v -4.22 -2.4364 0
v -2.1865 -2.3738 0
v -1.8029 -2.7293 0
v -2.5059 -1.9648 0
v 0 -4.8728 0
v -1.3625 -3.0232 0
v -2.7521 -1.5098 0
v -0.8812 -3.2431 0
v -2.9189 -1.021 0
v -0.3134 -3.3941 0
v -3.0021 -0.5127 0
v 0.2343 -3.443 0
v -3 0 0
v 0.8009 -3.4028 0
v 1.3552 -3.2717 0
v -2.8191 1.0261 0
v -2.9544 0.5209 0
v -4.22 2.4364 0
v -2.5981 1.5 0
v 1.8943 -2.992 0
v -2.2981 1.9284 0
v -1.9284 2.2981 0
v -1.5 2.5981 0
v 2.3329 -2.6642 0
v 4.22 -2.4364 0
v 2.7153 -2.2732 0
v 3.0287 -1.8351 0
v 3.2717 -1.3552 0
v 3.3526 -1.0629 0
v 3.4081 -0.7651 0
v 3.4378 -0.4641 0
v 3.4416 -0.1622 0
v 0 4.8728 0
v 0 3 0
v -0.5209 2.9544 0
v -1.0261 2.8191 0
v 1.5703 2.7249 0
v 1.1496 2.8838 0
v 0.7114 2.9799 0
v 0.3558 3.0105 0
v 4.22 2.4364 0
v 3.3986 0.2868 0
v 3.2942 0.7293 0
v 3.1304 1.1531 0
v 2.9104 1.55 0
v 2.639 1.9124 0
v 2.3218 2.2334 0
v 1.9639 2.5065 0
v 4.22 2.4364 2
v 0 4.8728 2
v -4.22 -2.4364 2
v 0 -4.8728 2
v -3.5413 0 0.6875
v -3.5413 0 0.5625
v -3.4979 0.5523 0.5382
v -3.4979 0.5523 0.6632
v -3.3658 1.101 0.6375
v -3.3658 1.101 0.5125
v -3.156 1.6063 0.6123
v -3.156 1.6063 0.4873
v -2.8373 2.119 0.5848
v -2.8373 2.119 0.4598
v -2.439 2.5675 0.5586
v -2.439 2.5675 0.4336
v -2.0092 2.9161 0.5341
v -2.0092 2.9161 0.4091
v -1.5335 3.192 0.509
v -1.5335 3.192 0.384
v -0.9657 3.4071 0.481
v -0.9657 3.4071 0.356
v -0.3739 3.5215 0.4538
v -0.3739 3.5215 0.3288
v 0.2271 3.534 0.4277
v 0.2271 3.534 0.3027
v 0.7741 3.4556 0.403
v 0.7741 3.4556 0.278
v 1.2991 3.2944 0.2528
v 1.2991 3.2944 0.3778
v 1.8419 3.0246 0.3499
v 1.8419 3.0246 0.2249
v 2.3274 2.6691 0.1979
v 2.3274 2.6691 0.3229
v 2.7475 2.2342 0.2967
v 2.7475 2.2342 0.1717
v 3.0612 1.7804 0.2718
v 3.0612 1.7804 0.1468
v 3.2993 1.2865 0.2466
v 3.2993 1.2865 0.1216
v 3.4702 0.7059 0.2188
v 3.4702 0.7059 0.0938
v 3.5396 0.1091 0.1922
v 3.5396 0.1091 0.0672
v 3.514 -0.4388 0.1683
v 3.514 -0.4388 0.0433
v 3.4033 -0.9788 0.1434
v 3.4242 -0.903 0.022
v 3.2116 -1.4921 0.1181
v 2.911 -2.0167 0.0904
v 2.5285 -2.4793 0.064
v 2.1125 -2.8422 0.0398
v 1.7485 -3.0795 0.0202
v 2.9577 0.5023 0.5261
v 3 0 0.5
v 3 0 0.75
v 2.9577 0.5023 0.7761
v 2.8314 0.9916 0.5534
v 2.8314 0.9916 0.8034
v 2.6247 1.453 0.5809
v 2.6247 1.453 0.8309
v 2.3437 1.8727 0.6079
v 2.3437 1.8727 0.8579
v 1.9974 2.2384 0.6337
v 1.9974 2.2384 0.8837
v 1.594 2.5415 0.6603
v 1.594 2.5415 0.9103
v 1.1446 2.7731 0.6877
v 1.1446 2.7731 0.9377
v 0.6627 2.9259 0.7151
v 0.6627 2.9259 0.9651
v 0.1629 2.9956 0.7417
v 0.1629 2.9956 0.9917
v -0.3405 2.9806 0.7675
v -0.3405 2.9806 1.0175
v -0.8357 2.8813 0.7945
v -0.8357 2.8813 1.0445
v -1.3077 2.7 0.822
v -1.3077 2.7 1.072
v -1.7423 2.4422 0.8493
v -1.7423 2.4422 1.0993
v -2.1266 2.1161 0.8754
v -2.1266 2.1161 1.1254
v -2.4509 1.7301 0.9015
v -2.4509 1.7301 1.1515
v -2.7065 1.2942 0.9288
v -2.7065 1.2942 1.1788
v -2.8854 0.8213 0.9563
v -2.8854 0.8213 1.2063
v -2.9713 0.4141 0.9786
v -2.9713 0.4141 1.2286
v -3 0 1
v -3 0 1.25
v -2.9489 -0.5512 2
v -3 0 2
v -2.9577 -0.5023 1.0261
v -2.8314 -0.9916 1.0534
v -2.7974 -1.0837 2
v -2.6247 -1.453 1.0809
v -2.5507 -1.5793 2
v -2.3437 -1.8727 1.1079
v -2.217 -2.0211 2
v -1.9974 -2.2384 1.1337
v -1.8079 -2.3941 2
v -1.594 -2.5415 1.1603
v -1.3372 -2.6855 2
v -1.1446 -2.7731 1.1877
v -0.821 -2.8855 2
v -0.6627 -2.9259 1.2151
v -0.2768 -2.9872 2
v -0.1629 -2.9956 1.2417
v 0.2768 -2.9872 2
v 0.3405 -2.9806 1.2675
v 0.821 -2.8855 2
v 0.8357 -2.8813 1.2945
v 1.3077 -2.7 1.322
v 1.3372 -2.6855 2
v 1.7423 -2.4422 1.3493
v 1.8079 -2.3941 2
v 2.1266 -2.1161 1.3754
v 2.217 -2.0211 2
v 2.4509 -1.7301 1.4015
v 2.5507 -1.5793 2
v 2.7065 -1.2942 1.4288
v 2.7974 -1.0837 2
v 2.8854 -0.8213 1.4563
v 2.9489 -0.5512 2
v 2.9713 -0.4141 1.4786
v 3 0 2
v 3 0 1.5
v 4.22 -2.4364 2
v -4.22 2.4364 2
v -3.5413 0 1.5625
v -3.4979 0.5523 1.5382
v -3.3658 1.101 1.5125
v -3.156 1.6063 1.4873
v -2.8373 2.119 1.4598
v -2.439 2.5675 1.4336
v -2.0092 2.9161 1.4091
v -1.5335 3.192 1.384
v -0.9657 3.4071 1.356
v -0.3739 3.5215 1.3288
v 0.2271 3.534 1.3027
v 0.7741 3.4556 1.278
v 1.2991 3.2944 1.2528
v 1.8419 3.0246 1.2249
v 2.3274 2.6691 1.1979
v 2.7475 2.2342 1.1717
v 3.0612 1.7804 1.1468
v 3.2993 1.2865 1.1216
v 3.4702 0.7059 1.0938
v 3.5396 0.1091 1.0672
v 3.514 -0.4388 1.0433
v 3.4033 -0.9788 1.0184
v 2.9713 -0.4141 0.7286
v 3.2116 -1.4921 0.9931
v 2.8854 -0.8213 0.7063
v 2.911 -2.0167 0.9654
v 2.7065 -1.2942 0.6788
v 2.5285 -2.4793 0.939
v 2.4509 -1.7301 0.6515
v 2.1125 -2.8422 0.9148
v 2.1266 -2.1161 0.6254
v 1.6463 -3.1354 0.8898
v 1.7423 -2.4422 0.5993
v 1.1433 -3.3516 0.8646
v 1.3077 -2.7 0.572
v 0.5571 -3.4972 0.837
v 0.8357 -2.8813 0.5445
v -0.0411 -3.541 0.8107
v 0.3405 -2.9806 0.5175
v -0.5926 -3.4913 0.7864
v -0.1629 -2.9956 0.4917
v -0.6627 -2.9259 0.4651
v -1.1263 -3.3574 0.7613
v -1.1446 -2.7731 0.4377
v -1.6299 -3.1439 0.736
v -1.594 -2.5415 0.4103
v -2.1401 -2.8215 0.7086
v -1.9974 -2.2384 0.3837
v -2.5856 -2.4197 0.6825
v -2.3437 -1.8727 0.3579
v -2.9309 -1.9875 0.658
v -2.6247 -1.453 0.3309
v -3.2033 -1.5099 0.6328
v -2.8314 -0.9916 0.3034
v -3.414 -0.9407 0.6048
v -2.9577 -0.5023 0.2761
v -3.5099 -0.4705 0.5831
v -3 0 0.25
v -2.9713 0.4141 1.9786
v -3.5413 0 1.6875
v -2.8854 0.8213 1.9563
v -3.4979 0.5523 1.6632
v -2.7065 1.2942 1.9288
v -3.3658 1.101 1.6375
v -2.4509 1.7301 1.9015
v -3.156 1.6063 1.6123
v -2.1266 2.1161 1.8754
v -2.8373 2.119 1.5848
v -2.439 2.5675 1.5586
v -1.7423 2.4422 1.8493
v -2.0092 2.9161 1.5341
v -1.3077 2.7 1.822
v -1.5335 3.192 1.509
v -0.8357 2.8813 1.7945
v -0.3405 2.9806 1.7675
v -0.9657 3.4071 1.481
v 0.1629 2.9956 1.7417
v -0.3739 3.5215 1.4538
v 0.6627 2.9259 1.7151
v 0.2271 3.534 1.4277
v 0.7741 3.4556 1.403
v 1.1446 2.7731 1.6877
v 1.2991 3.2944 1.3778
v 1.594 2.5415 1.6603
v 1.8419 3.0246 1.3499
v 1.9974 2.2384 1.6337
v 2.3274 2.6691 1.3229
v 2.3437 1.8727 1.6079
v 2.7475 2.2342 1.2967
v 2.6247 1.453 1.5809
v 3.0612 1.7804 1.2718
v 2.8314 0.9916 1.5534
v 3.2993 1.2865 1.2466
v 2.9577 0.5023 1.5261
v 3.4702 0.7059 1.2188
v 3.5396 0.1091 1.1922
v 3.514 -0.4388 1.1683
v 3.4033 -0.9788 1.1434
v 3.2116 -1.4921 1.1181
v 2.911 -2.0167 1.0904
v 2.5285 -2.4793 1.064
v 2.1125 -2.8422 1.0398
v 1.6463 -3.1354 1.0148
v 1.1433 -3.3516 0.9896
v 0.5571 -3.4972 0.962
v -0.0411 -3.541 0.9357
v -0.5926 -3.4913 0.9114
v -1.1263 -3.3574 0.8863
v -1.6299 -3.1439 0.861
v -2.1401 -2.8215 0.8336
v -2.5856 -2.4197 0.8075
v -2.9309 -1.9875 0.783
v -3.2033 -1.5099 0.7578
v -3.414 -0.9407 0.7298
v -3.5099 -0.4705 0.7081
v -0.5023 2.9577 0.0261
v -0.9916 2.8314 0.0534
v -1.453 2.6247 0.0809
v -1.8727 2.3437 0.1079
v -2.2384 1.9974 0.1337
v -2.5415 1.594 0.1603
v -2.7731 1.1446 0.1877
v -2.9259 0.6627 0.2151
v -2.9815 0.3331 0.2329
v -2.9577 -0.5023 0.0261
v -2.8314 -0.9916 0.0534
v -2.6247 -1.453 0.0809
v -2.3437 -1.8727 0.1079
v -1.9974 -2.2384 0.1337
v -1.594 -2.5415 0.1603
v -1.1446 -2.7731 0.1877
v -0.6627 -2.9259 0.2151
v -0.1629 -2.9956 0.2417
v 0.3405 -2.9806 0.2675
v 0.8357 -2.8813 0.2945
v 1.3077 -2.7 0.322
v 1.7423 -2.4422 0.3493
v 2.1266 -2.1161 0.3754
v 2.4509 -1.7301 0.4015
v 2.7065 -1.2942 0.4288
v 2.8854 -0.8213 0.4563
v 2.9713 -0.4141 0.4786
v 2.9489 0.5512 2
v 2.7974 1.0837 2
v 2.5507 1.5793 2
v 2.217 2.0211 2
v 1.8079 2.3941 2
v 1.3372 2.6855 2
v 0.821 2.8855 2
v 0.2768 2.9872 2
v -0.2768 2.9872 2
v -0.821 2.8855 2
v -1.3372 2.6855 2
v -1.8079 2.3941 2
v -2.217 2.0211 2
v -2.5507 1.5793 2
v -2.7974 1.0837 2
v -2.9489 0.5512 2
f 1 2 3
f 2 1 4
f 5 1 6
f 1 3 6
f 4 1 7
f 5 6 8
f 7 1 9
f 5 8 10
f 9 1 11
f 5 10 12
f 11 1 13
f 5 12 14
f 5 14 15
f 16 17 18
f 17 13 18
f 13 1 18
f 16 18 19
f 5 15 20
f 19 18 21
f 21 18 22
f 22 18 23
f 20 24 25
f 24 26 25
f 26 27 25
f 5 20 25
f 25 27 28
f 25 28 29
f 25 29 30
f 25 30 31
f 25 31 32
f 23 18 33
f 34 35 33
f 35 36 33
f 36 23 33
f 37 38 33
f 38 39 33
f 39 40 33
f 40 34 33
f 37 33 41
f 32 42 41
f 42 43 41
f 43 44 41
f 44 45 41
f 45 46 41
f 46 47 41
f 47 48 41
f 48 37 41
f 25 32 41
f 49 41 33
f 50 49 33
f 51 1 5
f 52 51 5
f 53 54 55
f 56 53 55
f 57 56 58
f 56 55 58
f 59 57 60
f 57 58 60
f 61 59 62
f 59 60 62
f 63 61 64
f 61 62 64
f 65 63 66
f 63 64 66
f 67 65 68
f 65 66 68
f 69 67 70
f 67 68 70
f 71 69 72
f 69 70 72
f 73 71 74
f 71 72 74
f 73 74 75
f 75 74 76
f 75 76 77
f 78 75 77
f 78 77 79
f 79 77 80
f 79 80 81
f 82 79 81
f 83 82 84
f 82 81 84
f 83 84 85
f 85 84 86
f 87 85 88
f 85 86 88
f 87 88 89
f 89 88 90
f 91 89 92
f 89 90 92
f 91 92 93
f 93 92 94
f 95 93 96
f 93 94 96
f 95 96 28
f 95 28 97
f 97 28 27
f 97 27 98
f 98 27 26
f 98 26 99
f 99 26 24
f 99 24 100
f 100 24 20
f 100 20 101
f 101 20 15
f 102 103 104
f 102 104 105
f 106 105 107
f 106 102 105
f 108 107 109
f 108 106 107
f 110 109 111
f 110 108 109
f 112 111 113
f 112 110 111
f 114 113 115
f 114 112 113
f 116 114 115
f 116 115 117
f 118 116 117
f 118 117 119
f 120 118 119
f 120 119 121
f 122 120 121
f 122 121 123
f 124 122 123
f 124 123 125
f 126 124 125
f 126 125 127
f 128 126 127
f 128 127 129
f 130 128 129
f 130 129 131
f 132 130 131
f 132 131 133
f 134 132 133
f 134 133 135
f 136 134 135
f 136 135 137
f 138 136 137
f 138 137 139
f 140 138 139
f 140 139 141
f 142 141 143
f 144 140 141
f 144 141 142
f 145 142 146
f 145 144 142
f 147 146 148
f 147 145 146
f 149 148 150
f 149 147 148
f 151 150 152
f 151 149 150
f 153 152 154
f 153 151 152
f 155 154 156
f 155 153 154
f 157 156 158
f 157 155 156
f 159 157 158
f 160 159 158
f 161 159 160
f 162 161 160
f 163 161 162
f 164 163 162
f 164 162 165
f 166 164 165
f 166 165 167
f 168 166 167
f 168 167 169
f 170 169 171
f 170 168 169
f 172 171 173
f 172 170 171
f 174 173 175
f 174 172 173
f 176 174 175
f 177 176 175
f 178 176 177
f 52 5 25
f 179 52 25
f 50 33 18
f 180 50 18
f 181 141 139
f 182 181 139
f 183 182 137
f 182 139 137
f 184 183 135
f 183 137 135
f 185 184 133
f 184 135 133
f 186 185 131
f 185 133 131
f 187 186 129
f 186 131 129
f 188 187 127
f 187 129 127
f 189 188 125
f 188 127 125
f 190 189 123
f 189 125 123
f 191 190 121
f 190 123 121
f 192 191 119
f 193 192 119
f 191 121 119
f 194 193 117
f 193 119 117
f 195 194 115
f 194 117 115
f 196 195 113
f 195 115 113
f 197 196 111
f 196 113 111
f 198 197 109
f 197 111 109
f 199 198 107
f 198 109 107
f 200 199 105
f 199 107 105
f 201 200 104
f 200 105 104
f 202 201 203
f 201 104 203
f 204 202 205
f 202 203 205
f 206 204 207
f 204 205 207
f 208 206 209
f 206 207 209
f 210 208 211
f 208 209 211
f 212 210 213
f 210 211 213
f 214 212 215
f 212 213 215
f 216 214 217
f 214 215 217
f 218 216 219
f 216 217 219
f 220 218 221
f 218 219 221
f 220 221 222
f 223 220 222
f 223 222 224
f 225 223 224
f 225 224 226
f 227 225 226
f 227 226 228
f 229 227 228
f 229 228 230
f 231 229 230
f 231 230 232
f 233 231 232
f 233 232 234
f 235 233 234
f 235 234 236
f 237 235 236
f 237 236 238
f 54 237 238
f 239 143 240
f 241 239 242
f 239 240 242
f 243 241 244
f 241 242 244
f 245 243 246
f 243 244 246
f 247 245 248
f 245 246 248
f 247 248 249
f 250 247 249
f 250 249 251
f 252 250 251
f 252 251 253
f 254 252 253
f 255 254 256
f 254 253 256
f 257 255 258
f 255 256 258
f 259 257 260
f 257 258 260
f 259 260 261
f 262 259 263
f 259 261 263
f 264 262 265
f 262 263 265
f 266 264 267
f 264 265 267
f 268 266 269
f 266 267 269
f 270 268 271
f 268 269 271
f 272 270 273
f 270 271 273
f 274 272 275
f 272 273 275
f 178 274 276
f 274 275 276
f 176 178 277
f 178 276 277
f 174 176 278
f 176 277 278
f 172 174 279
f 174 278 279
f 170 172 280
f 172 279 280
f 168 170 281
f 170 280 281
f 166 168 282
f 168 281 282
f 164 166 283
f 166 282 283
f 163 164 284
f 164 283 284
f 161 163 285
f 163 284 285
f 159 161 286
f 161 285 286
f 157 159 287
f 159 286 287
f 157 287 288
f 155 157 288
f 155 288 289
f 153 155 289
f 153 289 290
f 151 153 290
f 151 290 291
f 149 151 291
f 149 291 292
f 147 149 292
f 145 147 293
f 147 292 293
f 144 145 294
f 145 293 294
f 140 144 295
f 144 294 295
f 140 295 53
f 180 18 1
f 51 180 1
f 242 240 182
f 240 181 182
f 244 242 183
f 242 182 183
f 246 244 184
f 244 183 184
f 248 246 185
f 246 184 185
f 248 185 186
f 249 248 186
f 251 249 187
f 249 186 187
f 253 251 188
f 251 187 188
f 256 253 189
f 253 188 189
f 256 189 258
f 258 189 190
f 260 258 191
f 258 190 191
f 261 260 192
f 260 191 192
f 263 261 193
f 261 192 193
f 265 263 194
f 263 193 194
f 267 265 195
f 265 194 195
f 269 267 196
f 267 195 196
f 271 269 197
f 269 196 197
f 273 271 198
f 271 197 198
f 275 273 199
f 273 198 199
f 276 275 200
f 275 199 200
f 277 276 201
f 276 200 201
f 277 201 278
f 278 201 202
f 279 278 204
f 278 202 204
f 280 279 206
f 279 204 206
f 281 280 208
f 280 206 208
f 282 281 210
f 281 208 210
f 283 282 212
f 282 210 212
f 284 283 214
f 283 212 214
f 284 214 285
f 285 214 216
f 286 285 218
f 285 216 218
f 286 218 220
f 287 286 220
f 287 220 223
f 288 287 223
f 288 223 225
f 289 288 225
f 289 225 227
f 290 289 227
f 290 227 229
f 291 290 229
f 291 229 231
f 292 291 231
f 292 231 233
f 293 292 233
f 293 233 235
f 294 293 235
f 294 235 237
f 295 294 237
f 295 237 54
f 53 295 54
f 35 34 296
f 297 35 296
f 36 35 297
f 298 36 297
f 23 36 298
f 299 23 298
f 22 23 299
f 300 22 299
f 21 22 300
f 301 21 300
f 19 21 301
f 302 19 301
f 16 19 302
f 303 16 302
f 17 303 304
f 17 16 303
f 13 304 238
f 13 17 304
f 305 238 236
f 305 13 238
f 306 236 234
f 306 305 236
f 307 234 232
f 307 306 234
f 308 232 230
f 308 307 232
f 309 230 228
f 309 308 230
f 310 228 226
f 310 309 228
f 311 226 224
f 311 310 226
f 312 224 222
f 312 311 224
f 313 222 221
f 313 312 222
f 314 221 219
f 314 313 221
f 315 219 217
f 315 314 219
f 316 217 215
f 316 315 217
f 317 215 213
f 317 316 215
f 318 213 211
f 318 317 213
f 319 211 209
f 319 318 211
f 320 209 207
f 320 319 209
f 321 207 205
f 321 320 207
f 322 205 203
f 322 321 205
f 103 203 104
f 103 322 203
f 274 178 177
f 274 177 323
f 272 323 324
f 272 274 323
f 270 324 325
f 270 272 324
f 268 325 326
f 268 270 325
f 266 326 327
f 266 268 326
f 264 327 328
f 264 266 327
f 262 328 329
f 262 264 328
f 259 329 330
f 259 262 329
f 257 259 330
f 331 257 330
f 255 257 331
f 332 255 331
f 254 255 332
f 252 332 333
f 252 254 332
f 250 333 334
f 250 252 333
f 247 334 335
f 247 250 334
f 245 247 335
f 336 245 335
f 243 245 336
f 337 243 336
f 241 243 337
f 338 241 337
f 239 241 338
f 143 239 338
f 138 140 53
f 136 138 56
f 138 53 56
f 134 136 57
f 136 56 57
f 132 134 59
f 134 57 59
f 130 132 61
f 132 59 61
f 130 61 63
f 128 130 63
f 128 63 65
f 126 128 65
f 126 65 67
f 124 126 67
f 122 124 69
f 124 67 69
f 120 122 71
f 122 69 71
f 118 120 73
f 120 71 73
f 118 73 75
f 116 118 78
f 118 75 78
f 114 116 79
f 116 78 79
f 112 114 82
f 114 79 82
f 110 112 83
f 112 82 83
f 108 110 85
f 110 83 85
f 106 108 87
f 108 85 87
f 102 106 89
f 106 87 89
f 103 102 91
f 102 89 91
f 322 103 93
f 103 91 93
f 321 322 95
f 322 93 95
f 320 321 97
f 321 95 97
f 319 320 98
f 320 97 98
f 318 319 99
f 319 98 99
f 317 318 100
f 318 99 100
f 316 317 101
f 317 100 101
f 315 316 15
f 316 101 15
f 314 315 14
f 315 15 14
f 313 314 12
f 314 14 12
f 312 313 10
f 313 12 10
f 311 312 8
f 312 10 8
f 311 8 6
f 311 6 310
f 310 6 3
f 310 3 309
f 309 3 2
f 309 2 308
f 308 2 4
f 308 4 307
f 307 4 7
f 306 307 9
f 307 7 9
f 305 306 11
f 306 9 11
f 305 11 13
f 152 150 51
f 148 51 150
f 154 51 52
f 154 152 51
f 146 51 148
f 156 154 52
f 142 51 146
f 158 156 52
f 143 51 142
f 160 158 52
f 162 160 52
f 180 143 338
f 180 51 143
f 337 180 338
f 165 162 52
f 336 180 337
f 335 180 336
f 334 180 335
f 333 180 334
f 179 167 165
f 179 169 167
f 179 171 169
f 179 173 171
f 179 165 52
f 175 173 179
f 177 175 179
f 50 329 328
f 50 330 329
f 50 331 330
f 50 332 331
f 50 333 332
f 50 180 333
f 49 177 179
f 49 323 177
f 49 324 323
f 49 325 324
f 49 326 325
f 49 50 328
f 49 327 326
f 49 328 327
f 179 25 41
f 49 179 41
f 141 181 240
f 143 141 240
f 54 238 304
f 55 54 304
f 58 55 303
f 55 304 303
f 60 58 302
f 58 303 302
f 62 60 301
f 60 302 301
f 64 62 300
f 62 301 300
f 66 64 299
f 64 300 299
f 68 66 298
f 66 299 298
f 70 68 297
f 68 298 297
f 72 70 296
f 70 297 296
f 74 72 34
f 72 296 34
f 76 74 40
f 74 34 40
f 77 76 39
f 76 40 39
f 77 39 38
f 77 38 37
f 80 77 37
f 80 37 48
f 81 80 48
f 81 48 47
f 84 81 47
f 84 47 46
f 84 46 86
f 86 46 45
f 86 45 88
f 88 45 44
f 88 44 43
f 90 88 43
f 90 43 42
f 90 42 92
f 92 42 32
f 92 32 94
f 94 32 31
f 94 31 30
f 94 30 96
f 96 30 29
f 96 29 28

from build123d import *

# Parameters (mm, degrees)
SKETCH1_R           = 3
BOSS_EXTRUDE1_DEPTH = 2
THREAD1_PITCH       = 1


with BuildPart() as part:
    # Sketch1 → Boss-Extrude1 (new body)
    with BuildSketch(Plane.XY):
        Polygon((-4.22, -2.436418136), (0, -4.872836272), (4.22, -2.436418136), (4.22, 2.436418136), (0, 4.872836272), (-4.22, 2.436418136), align=None)
        Circle(SKETCH1_R, mode=Mode.SUBTRACT)
    extrude(amount=BOSS_EXTRUDE1_DEPTH)

    # Thread1: the profile of Thread Profile1 profile screwed along a right-hand helix of 2 turns, 8 arcs to a turn; built about Z, then put on its axis
    thread1_z = Axis((0, 0, 0), (0, 0, 1))
    thread1_corners = [(2.9997, 0, -0.000173205), (3.541265875, 0, 0.312499999), (3.541265875, 0, 0.437499999), (2.9997, 0, 0.750173202)]
    with BuildLine(mode=Mode.PRIVATE) as thread1_profile:
        Line(thread1_corners[0], thread1_corners[1])
        Line(thread1_corners[1], thread1_corners[2])
        Line(thread1_corners[2], thread1_corners[3])
        Line(thread1_corners[3], thread1_corners[0])
    thread1_cap = Face(thread1_profile.wire())
    thread1_turn_angles = [0, 22.5, 45, 67.5, 90, 112.5, 135, 157.5, 180, 202.5, 225, 247.5, 270, 292.5, 315, 337.5, 360]
    thread1_turn_weights = [1, 0.9238795325112867, 1, 0.9238795325112867, 1, 0.9238795325112867, 1, 0.9238795325112867, 1, 0.9238795325112867, 1, 0.9238795325112867, 1, 0.9238795325112867, 1, 0.9238795325112867, 1]
    thread1_turn_rails = [Edge.make_bspline([Vector(p[0], p[1], 0).rotate(thread1_z, thread1_turn_angles[k]) / thread1_turn_weights[k] + Vector(0, 0, p[2] + THREAD1_PITCH * thread1_turn_angles[k] / 360) for k in range(17)], [0, 0, 0, 1, 1, 2, 2, 3, 3, 4, 4, 5, 5, 6, 6, 7, 7, 8, 8, 8], 2, thread1_turn_weights) for p in thread1_corners]
    thread1_turn_sides = [Face.make_surface_from_curves(thread1_turn_rails[p[0]], thread1_turn_rails[p[1]]) for p in [(0, 1), (1, 2), (2, 3), (3, 0)]]
    thread1 = Plane(origin=(0, 0, 2), x_dir=(-1, 0, 0), z_dir=(0, 0, -1)) * Solid(Shell([*[p.moved(Location((0, 0, THREAD1_PITCH * i))) for i in range(2) for p in thread1_turn_sides], thread1_cap, thread1_cap.rotate(thread1_z, 720).moved(Location((0, 0, THREAD1_PITCH * 720 / 360)))]))
    add(thread1, mode=Mode.SUBTRACT)


solid = part.part
